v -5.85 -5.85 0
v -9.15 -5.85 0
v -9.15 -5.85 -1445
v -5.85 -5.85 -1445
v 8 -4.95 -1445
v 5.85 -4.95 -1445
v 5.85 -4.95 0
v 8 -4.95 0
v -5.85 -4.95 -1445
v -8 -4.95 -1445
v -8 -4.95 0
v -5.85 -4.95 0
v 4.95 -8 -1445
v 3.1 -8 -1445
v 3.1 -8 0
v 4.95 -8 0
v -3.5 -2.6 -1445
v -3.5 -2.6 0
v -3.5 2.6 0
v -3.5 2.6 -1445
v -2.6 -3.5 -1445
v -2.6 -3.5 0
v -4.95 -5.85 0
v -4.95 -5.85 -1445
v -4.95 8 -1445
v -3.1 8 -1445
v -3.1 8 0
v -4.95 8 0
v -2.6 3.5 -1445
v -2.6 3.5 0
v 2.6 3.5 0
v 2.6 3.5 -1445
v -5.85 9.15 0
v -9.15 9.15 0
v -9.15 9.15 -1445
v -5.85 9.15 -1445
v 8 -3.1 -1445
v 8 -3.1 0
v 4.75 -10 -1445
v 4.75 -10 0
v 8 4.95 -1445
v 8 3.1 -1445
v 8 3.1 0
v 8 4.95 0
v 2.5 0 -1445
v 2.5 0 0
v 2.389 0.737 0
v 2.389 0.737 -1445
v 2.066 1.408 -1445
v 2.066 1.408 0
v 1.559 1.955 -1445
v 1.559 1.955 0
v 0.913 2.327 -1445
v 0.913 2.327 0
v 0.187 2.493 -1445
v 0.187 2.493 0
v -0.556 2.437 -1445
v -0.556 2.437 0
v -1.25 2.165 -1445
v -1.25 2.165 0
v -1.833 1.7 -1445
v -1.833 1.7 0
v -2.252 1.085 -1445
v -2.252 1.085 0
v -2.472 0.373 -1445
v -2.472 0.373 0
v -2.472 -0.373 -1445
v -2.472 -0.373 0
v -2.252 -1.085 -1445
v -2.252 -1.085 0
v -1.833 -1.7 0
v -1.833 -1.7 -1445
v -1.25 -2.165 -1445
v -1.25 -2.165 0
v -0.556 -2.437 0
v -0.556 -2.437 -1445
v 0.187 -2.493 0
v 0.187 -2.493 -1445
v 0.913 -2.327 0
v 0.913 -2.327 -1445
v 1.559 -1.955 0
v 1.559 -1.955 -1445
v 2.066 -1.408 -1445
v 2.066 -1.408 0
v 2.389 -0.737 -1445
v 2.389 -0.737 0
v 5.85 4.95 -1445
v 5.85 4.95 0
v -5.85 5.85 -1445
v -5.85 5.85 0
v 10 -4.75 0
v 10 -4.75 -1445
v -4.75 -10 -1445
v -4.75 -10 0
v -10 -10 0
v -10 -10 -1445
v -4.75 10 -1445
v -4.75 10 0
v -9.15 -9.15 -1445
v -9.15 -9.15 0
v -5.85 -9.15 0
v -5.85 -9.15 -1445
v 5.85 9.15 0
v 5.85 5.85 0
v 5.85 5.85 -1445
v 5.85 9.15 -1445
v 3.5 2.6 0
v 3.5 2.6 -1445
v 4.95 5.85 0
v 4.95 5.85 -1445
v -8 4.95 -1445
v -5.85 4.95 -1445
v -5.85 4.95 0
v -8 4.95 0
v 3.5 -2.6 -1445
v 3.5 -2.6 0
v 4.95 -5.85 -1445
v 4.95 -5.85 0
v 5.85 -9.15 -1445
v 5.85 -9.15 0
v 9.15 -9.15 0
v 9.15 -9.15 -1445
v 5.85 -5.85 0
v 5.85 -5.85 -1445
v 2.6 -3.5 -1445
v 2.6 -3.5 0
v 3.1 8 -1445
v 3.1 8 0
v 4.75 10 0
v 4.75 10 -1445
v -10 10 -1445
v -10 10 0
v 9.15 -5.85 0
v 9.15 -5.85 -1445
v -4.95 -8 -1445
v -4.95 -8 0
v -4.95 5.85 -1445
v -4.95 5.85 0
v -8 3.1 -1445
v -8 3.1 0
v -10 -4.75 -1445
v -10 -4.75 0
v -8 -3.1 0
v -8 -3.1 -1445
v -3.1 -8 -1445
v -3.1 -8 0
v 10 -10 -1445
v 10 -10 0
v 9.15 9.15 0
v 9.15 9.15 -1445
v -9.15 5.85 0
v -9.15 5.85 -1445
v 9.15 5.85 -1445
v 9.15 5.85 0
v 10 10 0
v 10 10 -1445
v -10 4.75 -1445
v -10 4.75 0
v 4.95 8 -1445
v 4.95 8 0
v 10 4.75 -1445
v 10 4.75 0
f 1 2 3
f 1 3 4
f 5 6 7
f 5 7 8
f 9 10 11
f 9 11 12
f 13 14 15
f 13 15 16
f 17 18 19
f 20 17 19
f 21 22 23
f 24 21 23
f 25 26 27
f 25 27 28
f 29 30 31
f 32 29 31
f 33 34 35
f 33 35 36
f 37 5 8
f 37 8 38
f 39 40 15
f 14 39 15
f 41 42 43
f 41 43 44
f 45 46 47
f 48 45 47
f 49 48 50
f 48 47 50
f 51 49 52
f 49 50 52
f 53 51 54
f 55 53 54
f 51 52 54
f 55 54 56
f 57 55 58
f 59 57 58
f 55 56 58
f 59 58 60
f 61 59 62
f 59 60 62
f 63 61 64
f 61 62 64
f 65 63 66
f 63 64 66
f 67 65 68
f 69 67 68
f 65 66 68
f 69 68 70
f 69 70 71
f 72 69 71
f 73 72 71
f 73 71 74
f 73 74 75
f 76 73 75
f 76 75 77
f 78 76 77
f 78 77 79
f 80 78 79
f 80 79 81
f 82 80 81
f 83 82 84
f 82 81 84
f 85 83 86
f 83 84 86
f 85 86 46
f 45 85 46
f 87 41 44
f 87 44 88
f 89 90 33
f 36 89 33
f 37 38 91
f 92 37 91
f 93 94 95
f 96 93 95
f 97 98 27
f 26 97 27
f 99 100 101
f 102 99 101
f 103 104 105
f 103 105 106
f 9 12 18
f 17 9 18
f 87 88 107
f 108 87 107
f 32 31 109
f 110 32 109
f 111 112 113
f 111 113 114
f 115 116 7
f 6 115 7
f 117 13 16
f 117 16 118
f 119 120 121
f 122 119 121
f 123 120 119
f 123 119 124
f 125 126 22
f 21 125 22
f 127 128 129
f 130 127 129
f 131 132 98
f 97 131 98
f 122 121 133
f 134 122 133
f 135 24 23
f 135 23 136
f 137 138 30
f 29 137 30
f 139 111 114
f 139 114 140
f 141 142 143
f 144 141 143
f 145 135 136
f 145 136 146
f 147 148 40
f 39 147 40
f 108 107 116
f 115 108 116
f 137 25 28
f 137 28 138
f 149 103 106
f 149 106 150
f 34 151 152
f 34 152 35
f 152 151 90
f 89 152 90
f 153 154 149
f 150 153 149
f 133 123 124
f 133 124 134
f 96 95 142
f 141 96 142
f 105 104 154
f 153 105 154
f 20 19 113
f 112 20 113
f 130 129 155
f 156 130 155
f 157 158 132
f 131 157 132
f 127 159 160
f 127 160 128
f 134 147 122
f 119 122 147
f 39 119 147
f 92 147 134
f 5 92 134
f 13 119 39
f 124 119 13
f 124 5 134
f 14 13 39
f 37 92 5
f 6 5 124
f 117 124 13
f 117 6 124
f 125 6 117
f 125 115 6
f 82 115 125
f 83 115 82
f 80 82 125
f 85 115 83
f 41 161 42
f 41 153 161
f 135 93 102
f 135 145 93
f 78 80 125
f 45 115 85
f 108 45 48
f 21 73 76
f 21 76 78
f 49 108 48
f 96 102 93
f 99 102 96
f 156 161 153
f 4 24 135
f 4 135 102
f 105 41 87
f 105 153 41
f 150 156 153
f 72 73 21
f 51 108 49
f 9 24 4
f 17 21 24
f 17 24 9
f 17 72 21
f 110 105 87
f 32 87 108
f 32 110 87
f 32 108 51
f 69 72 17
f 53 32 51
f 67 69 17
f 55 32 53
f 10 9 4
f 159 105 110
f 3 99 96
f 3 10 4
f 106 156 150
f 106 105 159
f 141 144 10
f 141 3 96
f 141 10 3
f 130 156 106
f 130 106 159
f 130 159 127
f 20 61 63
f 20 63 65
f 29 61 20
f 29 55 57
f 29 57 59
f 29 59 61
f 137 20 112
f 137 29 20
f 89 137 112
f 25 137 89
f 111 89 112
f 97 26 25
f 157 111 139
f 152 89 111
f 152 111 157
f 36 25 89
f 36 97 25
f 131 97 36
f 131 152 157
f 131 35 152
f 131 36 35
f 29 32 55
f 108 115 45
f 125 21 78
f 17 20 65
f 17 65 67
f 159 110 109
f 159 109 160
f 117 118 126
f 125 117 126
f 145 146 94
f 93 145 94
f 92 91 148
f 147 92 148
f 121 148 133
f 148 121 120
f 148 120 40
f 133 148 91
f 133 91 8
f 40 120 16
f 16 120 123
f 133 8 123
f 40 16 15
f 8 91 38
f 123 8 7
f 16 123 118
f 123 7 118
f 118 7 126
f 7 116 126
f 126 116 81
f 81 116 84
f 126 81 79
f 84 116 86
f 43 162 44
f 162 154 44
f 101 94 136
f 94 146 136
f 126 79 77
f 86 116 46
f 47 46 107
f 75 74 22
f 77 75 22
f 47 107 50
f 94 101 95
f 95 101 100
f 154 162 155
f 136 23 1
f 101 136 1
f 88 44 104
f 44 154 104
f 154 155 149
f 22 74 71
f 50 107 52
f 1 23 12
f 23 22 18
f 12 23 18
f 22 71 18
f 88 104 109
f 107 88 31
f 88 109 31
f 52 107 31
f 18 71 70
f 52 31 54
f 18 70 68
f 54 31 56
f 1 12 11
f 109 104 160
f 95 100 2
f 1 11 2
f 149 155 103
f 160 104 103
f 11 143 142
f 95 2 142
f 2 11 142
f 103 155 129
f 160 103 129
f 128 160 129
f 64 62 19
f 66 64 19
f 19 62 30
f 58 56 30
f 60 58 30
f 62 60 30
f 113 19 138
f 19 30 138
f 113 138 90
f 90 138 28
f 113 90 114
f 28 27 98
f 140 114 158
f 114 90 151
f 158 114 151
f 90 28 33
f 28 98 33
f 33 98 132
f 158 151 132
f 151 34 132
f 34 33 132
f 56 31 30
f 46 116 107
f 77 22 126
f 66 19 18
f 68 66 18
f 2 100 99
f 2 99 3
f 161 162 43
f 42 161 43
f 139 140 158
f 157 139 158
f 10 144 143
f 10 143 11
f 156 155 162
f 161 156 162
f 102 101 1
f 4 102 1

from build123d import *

# Parameters (mm, degrees)
SKETCH_1_R      = 2.5
SKETCH_1_W      = 3.3
SKETCH_1_H      = 3.3
EXTRUDE_1_DEPTH = 1445


with BuildPart() as part:
    # Эскиз1 → Бобышка-Вытянуть1 (new body)
    with BuildSketch(Plane.XY):
        Polygon((-10, 10), (-4.75, 10), (-3.1, 8), (-4.95, 8), (-4.95, 5.85), (-2.6, 3.5), (2.6, 3.5), (4.95, 5.85), (4.95, 8), (3.1, 8), (4.75, 10), (10, 10), (10, 4.75), (8, 3.1), (8, 4.95), (5.85, 4.95), (3.5, 2.6), (3.5, -2.6), (5.85, -4.95), (8, -4.95), (8, -3.1), (10, -4.75), (10, -10), (4.75, -10), (3.1, -8), (4.95, -8), (4.95, -5.85), (2.6, -3.5), (-2.6, -3.5), (-4.95, -5.85), (-4.95, -8), (-3.1, -8), (-4.75, -10), (-10, -10), (-10, -4.75), (-8, -3.1), (-8, -4.95), (-5.85, -4.95), (-3.5, -2.6), (-3.5, 2.6), (-5.85, 4.95), (-8, 4.95), (-8, 3.1), (-10, 4.75), align=None)
        Circle(SKETCH_1_R, mode=Mode.SUBTRACT)
        with Locations((-7.5, 7.5)):
            Rectangle(SKETCH_1_W, SKETCH_1_H, mode=Mode.SUBTRACT)
        with Locations((7.5, 7.5)):
            Rectangle(SKETCH_1_W, SKETCH_1_H, mode=Mode.SUBTRACT)
        with Locations((7.5, -7.5)):
            Rectangle(SKETCH_1_W, SKETCH_1_H, mode=Mode.SUBTRACT)
        with Locations((-7.5, -7.5)):
            Rectangle(SKETCH_1_W, SKETCH_1_H, mode=Mode.SUBTRACT)
    extrude(amount=-EXTRUDE_1_DEPTH)


solid = part.part
